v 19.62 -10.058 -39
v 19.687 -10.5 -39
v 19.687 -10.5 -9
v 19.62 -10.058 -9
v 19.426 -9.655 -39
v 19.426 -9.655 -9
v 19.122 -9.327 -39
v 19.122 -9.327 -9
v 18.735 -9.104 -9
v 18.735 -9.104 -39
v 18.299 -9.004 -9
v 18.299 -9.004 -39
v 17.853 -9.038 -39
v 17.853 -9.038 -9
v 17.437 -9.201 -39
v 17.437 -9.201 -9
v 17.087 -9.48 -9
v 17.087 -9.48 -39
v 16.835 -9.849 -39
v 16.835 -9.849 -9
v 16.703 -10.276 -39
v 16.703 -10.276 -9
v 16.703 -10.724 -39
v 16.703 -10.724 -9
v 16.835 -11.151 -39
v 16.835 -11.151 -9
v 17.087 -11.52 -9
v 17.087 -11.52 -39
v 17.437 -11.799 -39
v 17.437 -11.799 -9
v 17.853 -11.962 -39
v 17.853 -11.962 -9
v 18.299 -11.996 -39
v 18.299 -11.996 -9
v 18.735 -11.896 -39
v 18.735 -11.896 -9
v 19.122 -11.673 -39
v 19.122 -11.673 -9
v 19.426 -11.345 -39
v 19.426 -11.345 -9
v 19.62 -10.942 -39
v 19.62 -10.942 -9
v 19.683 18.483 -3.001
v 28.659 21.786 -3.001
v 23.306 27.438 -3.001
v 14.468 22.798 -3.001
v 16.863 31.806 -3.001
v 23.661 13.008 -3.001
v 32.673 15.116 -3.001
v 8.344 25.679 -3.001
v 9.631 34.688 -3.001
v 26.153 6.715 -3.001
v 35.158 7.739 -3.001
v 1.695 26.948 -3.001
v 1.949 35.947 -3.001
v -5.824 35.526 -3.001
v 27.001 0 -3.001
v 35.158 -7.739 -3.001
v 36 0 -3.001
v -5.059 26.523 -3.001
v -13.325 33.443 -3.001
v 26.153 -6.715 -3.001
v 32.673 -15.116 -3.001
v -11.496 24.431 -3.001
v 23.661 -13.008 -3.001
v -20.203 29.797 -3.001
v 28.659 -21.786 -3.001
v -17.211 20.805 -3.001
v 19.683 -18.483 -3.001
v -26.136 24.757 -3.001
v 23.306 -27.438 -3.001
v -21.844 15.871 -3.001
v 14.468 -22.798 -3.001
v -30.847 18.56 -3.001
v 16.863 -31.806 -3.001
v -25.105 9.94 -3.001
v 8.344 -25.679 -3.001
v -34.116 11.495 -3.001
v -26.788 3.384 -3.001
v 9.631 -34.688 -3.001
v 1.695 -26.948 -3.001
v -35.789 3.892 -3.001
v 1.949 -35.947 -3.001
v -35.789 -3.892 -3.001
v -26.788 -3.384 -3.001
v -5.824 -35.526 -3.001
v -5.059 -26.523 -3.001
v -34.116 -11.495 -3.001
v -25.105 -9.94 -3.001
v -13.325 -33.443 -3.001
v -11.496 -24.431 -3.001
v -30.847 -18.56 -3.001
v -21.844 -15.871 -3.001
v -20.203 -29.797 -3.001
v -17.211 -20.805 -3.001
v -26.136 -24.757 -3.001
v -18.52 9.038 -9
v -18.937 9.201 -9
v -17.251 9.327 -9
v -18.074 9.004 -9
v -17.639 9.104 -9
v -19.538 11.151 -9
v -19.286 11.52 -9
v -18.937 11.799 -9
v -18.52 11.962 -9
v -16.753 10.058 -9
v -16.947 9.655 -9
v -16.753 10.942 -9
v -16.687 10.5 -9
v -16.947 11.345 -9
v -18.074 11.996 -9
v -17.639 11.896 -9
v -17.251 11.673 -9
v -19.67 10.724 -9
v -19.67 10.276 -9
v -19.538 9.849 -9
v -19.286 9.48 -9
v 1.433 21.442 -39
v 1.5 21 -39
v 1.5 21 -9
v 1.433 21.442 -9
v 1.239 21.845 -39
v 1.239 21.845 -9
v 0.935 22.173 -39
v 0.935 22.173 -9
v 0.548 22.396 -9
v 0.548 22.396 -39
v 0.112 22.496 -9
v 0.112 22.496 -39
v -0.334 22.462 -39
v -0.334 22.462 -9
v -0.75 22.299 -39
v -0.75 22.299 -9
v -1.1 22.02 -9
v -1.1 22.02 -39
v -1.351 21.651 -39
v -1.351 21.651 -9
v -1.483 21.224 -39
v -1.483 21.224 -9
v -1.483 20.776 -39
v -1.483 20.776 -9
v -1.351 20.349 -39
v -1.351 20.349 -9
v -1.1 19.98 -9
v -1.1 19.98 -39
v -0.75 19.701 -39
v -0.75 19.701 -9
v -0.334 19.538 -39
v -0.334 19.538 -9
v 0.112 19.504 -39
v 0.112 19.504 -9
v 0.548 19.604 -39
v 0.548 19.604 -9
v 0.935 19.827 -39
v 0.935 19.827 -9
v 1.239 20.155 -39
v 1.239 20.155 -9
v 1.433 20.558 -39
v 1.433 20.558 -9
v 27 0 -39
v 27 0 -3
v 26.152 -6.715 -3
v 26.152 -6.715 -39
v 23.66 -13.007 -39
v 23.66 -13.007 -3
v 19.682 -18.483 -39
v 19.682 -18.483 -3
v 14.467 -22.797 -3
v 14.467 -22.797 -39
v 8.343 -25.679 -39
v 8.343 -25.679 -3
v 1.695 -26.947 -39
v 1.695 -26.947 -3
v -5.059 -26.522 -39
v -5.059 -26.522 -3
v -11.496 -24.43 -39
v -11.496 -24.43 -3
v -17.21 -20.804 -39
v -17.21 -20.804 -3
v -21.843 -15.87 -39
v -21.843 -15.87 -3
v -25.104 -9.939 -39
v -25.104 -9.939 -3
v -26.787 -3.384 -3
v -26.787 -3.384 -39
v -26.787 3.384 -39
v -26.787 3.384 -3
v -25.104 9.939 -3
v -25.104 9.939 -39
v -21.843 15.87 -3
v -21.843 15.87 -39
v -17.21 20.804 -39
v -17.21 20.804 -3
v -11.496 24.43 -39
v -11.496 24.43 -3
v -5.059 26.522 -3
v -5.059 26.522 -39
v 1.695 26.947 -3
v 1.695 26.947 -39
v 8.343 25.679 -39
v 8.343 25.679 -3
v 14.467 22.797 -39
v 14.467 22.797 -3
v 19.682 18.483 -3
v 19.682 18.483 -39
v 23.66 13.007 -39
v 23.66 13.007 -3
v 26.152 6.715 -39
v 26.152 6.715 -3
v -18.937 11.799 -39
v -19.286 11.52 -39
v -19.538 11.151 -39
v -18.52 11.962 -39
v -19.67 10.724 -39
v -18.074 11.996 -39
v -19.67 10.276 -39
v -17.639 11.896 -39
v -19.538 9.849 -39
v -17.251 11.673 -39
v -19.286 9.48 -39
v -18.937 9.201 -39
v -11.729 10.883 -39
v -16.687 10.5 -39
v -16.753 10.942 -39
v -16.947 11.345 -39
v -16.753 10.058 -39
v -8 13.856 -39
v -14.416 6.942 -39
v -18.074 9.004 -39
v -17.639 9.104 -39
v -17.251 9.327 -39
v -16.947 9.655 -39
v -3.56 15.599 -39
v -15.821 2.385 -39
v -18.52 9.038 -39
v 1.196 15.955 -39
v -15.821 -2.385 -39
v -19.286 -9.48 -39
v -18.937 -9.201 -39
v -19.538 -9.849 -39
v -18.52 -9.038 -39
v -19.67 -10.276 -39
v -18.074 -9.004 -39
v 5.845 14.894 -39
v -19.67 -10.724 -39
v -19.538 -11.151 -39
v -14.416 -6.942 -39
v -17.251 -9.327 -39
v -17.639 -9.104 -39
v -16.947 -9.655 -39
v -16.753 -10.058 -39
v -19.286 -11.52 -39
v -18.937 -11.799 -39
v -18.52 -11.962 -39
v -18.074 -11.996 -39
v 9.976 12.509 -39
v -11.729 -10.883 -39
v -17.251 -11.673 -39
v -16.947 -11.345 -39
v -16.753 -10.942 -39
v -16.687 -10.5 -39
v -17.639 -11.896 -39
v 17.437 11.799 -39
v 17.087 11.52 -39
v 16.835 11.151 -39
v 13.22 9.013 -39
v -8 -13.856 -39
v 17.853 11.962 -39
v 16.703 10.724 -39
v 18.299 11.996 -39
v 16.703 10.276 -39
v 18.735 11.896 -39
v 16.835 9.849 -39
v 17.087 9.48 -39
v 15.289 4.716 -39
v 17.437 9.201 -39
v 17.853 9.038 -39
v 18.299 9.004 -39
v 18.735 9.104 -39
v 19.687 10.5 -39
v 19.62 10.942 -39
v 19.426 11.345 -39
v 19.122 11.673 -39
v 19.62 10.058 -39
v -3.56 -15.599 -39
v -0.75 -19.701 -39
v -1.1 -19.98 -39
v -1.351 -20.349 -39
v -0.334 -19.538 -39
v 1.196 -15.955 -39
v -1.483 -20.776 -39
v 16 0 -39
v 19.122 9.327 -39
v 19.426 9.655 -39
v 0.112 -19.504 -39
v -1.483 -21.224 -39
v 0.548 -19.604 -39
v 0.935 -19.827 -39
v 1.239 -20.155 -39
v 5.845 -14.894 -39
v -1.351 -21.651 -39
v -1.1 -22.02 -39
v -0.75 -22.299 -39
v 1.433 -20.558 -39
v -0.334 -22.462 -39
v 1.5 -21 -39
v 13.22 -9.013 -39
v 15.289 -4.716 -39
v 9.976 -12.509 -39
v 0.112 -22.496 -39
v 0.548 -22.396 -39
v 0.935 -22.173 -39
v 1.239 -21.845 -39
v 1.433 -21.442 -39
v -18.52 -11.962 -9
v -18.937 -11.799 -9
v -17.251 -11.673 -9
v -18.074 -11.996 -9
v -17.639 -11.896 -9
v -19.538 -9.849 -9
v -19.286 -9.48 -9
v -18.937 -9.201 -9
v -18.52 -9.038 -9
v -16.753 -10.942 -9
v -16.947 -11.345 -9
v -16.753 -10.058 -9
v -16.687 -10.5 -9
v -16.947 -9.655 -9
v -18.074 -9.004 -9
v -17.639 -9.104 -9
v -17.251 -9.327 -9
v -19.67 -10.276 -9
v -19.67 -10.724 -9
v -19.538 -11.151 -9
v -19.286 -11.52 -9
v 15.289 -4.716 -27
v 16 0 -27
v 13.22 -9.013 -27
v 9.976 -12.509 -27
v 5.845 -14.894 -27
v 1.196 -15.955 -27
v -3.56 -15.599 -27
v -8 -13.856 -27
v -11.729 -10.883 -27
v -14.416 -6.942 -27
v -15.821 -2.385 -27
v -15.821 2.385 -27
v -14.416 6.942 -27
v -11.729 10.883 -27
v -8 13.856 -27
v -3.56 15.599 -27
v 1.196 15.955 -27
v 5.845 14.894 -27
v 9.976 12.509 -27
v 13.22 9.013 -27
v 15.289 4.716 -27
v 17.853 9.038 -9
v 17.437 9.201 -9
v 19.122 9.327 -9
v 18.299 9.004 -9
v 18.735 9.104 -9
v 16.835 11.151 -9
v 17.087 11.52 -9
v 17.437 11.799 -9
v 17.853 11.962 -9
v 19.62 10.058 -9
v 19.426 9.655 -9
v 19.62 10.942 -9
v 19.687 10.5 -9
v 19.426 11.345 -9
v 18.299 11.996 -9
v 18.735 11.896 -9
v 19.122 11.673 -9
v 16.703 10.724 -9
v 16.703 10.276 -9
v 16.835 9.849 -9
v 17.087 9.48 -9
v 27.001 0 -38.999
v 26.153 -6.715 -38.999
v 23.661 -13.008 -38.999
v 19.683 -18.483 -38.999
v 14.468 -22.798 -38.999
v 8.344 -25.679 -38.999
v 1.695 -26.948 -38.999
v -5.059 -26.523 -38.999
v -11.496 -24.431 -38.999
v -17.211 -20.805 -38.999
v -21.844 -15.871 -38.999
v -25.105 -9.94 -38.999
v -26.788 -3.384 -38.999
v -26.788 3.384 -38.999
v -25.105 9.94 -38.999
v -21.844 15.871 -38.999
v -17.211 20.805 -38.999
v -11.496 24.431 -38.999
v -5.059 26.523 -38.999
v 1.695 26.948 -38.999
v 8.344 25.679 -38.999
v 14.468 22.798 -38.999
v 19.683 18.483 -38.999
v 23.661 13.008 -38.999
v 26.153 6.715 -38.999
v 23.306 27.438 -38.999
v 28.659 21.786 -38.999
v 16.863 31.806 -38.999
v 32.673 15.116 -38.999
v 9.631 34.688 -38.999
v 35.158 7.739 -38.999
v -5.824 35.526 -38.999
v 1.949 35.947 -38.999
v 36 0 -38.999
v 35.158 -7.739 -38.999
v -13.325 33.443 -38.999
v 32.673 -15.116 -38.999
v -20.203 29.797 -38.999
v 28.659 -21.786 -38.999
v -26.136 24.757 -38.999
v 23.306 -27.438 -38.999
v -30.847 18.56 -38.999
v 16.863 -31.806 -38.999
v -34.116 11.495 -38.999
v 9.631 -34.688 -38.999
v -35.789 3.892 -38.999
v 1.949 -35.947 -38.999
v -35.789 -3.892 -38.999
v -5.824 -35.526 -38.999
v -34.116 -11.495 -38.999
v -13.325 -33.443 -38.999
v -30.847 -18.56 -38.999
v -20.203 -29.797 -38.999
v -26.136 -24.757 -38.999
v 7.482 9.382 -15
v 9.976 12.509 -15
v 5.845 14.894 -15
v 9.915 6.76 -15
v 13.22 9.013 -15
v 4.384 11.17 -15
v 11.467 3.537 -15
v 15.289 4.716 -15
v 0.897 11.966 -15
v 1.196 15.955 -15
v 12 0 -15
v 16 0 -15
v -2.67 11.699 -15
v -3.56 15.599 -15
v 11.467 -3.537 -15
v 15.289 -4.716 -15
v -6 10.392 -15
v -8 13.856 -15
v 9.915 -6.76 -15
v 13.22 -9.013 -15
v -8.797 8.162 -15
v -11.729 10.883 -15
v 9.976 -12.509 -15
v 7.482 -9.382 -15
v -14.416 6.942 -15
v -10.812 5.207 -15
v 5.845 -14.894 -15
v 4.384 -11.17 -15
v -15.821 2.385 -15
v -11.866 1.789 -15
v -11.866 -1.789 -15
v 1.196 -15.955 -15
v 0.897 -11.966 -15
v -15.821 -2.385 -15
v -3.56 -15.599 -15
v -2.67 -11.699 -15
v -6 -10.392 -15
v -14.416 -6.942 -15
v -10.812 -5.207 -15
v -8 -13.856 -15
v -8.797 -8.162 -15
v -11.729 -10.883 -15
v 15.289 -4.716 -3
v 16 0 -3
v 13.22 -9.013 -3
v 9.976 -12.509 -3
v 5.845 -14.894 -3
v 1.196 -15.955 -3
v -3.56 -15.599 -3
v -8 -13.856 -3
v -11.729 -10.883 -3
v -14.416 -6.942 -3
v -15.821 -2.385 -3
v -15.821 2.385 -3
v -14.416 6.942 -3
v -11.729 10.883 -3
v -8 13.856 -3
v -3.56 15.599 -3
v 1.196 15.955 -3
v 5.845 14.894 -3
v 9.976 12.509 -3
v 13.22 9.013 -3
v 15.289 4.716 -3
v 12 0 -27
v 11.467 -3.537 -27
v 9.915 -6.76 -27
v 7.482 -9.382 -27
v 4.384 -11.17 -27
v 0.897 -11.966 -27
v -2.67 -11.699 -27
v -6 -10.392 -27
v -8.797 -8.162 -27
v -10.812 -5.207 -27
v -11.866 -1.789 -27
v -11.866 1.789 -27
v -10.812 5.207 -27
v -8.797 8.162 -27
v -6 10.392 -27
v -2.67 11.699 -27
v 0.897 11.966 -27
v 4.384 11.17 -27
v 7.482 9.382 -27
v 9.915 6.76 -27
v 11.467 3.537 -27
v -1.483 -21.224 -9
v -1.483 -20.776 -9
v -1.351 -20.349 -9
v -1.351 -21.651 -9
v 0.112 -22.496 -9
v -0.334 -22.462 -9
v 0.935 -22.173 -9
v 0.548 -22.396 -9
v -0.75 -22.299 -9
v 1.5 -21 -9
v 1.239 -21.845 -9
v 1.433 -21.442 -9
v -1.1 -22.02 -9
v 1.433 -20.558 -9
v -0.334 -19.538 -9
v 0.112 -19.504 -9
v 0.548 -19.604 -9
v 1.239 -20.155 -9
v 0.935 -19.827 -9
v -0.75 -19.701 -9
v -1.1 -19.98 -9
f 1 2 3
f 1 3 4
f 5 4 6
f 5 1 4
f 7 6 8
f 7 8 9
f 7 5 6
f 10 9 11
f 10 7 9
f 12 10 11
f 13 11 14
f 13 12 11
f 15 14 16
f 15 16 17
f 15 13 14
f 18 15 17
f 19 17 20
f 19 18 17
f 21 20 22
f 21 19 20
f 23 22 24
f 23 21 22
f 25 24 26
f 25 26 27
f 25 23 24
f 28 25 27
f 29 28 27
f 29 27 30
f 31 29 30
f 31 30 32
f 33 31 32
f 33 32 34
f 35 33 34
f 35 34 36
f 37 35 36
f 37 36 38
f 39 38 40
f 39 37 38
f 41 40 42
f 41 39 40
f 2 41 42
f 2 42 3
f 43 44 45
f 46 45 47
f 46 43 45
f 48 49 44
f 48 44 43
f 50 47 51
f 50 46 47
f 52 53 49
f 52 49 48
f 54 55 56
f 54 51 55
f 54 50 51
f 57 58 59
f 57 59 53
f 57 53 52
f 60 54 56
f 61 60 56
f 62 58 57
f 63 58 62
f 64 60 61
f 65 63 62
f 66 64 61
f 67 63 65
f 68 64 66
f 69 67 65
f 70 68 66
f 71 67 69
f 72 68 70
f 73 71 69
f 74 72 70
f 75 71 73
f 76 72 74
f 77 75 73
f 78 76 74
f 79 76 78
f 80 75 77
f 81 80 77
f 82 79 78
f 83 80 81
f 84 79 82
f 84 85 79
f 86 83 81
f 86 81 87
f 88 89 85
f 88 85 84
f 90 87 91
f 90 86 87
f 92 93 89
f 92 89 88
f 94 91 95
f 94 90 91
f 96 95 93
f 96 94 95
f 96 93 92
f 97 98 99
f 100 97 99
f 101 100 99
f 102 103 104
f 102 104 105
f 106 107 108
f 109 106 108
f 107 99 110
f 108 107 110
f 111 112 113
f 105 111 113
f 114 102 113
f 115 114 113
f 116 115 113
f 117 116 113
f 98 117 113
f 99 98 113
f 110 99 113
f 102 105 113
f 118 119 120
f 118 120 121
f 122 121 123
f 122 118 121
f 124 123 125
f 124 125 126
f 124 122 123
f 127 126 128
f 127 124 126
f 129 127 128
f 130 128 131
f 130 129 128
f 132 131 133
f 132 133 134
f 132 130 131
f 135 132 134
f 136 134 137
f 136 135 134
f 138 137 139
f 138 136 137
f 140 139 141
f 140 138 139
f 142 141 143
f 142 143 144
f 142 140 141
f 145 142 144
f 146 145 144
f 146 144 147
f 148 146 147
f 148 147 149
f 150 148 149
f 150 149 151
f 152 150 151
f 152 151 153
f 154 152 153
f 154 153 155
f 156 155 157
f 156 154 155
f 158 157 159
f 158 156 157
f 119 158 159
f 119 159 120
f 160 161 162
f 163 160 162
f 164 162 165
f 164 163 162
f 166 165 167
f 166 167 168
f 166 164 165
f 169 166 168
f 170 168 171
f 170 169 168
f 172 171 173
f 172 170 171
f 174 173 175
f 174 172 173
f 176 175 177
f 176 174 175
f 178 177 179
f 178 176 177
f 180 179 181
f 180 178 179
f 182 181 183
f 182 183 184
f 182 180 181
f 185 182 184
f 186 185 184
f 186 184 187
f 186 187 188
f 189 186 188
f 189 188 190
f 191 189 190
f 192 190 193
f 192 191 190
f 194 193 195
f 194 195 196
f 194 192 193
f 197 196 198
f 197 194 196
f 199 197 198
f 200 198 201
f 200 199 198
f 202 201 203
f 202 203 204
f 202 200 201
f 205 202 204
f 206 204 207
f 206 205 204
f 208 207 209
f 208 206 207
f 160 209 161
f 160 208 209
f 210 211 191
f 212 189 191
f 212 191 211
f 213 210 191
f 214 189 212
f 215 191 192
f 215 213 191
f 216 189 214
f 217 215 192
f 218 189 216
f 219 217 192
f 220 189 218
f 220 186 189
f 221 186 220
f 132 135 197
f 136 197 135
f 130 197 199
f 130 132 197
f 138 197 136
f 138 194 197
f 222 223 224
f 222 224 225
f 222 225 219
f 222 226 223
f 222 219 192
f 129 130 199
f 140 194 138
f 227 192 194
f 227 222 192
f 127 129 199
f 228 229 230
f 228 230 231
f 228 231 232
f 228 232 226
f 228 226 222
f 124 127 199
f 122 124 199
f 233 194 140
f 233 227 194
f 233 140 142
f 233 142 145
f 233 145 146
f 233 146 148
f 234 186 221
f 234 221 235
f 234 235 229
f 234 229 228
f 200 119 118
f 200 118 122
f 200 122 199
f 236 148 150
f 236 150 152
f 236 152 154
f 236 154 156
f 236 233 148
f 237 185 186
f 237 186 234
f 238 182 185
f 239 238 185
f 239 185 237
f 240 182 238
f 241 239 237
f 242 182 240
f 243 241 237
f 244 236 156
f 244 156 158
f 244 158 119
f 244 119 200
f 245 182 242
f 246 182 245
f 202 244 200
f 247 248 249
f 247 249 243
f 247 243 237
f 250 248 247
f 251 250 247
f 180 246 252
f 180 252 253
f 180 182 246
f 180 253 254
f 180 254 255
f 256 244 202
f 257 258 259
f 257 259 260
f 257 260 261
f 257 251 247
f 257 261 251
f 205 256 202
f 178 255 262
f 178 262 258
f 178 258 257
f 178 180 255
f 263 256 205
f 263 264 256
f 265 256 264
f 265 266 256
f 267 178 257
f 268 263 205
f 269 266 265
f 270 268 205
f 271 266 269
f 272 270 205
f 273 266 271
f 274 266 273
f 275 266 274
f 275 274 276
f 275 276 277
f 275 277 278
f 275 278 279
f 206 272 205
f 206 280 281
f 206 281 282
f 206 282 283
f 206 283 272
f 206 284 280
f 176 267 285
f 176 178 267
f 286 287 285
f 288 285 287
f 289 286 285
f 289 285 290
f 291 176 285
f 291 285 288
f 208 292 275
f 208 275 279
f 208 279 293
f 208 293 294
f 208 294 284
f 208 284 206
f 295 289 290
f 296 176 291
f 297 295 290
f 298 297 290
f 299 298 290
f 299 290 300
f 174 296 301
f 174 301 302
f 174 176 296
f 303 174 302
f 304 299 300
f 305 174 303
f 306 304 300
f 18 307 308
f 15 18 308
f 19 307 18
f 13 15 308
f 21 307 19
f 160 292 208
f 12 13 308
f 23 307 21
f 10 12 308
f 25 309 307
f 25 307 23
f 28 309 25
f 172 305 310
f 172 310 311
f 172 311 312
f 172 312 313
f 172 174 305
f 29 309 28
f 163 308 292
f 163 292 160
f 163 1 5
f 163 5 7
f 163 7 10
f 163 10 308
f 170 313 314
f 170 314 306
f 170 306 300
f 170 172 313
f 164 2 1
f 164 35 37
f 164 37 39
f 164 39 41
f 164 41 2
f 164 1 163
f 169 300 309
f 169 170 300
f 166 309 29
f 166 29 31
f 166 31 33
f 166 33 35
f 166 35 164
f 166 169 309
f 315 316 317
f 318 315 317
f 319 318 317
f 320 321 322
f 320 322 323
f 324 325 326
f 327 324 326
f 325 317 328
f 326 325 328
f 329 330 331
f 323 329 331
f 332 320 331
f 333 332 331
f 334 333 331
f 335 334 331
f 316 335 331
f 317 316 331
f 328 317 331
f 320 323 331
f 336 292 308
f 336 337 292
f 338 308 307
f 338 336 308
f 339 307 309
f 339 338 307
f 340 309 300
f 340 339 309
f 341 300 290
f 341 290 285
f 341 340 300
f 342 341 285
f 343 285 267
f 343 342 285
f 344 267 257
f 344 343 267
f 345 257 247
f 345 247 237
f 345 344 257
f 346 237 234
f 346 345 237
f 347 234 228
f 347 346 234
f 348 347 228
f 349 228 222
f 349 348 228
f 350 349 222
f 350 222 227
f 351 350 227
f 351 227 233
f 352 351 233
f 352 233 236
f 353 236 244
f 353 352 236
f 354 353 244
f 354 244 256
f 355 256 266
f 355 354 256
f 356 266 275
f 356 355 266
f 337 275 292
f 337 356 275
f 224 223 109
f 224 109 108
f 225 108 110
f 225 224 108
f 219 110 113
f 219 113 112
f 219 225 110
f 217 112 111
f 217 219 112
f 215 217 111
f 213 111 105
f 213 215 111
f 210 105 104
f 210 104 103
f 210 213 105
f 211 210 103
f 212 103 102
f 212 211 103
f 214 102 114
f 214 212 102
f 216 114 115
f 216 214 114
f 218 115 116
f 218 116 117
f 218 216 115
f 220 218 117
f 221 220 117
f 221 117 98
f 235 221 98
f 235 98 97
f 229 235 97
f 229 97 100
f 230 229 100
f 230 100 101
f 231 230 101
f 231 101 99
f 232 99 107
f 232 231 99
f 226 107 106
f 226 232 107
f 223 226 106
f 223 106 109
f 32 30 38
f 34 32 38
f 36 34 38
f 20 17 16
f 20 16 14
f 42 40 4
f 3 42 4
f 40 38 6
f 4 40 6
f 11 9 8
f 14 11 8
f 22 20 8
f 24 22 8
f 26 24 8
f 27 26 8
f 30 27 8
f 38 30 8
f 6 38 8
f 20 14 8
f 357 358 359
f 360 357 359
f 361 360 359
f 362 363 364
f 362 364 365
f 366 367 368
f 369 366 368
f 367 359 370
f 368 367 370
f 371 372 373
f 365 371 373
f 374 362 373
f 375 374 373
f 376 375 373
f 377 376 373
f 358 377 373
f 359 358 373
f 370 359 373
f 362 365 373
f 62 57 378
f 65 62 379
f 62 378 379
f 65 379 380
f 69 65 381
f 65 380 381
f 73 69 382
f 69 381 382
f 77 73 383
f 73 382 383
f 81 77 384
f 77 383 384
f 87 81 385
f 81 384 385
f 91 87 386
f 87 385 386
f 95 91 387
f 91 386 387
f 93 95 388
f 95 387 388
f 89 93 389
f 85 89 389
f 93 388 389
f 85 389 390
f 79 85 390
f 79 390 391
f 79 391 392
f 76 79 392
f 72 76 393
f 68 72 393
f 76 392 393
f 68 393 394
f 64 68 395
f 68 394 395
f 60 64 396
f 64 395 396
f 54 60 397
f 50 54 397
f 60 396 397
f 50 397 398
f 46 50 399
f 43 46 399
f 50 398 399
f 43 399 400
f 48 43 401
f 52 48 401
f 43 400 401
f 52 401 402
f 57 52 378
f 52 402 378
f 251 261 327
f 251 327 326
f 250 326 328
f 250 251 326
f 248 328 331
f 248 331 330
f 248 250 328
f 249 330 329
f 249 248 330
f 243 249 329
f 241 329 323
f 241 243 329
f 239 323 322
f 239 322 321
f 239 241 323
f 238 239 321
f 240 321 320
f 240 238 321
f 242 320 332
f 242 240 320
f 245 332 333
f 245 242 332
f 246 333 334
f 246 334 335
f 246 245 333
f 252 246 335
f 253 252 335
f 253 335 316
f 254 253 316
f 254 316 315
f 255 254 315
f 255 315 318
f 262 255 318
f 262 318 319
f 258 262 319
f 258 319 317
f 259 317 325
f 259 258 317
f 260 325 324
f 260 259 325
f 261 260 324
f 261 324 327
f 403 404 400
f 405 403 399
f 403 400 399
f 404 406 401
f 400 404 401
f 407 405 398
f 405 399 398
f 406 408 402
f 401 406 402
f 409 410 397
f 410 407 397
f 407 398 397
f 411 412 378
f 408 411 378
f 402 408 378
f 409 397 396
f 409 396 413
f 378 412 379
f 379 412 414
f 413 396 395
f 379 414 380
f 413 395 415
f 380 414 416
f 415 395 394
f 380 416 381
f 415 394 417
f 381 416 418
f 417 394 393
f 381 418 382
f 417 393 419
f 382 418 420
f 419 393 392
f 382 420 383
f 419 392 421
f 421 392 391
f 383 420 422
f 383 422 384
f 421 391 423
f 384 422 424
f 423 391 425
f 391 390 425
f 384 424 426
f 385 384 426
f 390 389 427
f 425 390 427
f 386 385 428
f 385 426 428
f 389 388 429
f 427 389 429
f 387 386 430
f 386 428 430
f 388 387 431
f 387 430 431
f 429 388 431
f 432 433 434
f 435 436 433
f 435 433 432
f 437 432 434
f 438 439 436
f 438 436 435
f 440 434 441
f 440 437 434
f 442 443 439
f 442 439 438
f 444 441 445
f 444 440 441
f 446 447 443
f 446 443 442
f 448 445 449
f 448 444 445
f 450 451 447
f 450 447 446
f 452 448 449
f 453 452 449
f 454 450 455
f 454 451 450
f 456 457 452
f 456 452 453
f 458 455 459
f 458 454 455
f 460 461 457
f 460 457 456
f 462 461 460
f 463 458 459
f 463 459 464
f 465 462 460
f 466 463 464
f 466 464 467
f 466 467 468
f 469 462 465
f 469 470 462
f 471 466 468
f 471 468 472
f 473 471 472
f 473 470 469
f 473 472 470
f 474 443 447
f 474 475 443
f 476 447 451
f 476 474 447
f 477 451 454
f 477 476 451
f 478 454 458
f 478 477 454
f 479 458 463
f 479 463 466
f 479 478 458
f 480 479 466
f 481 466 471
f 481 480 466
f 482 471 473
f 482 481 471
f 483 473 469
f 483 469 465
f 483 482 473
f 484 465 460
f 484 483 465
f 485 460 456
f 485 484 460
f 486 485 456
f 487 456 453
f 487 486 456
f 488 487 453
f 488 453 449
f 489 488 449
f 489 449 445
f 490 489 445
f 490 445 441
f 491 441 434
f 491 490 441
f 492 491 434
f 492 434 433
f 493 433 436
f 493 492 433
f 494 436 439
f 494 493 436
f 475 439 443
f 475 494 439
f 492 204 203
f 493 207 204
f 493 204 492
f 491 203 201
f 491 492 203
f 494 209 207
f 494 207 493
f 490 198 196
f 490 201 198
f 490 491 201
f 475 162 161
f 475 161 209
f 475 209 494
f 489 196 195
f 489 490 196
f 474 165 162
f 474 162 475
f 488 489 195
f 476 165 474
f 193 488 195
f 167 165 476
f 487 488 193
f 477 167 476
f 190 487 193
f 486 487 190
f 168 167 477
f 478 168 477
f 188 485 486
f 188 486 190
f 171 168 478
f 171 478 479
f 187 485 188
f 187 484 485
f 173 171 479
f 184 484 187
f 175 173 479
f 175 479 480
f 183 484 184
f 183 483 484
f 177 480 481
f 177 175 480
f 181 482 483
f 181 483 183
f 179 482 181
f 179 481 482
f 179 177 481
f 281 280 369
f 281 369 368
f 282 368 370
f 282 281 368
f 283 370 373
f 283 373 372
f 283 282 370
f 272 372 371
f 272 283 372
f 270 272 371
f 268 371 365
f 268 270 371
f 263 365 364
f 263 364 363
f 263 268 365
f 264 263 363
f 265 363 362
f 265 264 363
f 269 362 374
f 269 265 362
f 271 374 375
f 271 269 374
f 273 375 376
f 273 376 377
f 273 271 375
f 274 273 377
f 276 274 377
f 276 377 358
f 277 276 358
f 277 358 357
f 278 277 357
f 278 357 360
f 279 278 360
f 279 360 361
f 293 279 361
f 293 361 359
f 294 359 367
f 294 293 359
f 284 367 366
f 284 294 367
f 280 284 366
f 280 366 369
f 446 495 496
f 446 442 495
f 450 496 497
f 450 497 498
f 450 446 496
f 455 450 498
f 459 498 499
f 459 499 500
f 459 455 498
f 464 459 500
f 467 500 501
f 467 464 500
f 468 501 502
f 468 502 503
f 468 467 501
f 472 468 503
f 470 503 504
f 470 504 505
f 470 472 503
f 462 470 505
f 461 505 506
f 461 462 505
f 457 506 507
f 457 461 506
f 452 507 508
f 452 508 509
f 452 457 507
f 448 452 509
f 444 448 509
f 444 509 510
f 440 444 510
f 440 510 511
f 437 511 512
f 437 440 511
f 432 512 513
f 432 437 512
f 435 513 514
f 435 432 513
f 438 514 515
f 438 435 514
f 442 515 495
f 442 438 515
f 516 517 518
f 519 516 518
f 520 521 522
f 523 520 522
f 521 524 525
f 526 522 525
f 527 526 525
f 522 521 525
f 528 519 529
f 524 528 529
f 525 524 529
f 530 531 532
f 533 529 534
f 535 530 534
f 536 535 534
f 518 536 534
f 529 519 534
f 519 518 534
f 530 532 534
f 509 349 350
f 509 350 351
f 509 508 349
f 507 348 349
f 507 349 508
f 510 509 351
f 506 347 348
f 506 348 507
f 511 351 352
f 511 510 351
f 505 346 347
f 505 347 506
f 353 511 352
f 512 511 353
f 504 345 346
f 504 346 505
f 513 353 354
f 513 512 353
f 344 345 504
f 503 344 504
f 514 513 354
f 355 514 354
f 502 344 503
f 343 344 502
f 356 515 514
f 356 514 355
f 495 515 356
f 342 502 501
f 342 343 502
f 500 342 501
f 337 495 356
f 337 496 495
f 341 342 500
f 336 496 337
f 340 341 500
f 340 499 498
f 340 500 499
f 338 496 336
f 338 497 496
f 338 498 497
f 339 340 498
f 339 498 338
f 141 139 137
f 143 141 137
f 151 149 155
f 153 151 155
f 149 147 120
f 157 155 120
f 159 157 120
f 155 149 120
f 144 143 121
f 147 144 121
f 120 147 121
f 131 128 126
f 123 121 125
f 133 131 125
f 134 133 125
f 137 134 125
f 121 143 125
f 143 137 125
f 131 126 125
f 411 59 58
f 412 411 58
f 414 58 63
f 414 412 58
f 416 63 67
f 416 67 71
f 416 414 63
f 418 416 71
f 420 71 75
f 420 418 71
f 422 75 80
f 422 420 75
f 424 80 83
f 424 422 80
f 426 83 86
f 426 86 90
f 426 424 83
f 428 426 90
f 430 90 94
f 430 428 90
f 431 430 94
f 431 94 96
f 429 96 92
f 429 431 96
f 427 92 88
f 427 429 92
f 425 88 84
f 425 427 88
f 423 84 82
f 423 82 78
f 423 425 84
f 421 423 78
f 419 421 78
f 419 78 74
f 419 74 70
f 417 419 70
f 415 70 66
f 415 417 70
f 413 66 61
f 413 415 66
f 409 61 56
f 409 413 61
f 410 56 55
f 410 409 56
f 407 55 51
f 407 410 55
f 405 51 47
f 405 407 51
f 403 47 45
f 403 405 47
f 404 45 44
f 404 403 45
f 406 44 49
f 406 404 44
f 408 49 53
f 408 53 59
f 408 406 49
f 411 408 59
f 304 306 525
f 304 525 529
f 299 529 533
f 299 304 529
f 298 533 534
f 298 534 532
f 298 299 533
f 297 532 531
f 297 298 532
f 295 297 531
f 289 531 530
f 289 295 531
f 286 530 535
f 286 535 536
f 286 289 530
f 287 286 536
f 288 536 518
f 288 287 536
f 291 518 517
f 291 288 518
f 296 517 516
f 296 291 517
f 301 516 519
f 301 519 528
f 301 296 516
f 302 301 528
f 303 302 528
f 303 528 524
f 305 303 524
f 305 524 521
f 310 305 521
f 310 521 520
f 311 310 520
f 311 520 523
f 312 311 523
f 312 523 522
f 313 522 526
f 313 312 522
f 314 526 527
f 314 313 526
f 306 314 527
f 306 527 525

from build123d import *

# Parameters (mm, degrees)
SKETCH3_W          = 35.998
SKETCH3_H          = 8.999
SKETCH2_R          = 1.5
CUT_EXTRUDE1_DEPTH = 30


with BuildPart() as part:
    # Sketch1 → Revolve1 (revolve)
    with BuildSketch(Plane(origin=(0, 0, 0), x_dir=(0, 0, -1), z_dir=(1, 0, 0)), mode=Mode.PRIVATE) as revolve1_sk:
        Polygon((3, 27), (39, 27), (39, 16), (27, 16), (27, 12), (15, 12), (15, 16), (3, 16), align=None)
    revolve(revolve1_sk.sketch.rotate(Axis((0, 0, 0), (0, 0, -1)), 90), axis=Axis((0, 0, 0), (0, 0, -1)))

    # Sketch2 → Cut-Extrude1 (cut)
    with BuildSketch(Plane.XY.offset(-39)):
        with Locations((0, 21)):
            Circle(SKETCH2_R)
        with Locations((18.186533479, 10.5)):
            Circle(SKETCH2_R)
        with Locations((18.186533479, -10.5)):
            Circle(SKETCH2_R)
        with Locations((0, -21)):
            Circle(SKETCH2_R)
        with Locations((-18.186533479, -10.5)):
            Circle(SKETCH2_R)
        with Locations((-18.186533479, 10.5)):
            Circle(SKETCH2_R)
    extrude(amount=CUT_EXTRUDE1_DEPTH, mode=Mode.SUBTRACT)


with BuildPart() as body_2:
    # Sketch3 → Revolve2 (revolve)
    with BuildSketch(Plane(origin=(0, 0, 0), x_dir=(0, 0, -1), z_dir=(1, 0, 0)), mode=Mode.PRIVATE) as revolve2_sk:
        with Locations((21, 31.5005)):
            Rectangle(SKETCH3_W, SKETCH3_H)
    revolve(revolve2_sk.sketch.rotate(Axis((0, 0, 0), (0, 0, -1)), 90), axis=Axis((0, 0, 0), (0, 0, -1)))


solid = Compound([part.part, body_2.part])
